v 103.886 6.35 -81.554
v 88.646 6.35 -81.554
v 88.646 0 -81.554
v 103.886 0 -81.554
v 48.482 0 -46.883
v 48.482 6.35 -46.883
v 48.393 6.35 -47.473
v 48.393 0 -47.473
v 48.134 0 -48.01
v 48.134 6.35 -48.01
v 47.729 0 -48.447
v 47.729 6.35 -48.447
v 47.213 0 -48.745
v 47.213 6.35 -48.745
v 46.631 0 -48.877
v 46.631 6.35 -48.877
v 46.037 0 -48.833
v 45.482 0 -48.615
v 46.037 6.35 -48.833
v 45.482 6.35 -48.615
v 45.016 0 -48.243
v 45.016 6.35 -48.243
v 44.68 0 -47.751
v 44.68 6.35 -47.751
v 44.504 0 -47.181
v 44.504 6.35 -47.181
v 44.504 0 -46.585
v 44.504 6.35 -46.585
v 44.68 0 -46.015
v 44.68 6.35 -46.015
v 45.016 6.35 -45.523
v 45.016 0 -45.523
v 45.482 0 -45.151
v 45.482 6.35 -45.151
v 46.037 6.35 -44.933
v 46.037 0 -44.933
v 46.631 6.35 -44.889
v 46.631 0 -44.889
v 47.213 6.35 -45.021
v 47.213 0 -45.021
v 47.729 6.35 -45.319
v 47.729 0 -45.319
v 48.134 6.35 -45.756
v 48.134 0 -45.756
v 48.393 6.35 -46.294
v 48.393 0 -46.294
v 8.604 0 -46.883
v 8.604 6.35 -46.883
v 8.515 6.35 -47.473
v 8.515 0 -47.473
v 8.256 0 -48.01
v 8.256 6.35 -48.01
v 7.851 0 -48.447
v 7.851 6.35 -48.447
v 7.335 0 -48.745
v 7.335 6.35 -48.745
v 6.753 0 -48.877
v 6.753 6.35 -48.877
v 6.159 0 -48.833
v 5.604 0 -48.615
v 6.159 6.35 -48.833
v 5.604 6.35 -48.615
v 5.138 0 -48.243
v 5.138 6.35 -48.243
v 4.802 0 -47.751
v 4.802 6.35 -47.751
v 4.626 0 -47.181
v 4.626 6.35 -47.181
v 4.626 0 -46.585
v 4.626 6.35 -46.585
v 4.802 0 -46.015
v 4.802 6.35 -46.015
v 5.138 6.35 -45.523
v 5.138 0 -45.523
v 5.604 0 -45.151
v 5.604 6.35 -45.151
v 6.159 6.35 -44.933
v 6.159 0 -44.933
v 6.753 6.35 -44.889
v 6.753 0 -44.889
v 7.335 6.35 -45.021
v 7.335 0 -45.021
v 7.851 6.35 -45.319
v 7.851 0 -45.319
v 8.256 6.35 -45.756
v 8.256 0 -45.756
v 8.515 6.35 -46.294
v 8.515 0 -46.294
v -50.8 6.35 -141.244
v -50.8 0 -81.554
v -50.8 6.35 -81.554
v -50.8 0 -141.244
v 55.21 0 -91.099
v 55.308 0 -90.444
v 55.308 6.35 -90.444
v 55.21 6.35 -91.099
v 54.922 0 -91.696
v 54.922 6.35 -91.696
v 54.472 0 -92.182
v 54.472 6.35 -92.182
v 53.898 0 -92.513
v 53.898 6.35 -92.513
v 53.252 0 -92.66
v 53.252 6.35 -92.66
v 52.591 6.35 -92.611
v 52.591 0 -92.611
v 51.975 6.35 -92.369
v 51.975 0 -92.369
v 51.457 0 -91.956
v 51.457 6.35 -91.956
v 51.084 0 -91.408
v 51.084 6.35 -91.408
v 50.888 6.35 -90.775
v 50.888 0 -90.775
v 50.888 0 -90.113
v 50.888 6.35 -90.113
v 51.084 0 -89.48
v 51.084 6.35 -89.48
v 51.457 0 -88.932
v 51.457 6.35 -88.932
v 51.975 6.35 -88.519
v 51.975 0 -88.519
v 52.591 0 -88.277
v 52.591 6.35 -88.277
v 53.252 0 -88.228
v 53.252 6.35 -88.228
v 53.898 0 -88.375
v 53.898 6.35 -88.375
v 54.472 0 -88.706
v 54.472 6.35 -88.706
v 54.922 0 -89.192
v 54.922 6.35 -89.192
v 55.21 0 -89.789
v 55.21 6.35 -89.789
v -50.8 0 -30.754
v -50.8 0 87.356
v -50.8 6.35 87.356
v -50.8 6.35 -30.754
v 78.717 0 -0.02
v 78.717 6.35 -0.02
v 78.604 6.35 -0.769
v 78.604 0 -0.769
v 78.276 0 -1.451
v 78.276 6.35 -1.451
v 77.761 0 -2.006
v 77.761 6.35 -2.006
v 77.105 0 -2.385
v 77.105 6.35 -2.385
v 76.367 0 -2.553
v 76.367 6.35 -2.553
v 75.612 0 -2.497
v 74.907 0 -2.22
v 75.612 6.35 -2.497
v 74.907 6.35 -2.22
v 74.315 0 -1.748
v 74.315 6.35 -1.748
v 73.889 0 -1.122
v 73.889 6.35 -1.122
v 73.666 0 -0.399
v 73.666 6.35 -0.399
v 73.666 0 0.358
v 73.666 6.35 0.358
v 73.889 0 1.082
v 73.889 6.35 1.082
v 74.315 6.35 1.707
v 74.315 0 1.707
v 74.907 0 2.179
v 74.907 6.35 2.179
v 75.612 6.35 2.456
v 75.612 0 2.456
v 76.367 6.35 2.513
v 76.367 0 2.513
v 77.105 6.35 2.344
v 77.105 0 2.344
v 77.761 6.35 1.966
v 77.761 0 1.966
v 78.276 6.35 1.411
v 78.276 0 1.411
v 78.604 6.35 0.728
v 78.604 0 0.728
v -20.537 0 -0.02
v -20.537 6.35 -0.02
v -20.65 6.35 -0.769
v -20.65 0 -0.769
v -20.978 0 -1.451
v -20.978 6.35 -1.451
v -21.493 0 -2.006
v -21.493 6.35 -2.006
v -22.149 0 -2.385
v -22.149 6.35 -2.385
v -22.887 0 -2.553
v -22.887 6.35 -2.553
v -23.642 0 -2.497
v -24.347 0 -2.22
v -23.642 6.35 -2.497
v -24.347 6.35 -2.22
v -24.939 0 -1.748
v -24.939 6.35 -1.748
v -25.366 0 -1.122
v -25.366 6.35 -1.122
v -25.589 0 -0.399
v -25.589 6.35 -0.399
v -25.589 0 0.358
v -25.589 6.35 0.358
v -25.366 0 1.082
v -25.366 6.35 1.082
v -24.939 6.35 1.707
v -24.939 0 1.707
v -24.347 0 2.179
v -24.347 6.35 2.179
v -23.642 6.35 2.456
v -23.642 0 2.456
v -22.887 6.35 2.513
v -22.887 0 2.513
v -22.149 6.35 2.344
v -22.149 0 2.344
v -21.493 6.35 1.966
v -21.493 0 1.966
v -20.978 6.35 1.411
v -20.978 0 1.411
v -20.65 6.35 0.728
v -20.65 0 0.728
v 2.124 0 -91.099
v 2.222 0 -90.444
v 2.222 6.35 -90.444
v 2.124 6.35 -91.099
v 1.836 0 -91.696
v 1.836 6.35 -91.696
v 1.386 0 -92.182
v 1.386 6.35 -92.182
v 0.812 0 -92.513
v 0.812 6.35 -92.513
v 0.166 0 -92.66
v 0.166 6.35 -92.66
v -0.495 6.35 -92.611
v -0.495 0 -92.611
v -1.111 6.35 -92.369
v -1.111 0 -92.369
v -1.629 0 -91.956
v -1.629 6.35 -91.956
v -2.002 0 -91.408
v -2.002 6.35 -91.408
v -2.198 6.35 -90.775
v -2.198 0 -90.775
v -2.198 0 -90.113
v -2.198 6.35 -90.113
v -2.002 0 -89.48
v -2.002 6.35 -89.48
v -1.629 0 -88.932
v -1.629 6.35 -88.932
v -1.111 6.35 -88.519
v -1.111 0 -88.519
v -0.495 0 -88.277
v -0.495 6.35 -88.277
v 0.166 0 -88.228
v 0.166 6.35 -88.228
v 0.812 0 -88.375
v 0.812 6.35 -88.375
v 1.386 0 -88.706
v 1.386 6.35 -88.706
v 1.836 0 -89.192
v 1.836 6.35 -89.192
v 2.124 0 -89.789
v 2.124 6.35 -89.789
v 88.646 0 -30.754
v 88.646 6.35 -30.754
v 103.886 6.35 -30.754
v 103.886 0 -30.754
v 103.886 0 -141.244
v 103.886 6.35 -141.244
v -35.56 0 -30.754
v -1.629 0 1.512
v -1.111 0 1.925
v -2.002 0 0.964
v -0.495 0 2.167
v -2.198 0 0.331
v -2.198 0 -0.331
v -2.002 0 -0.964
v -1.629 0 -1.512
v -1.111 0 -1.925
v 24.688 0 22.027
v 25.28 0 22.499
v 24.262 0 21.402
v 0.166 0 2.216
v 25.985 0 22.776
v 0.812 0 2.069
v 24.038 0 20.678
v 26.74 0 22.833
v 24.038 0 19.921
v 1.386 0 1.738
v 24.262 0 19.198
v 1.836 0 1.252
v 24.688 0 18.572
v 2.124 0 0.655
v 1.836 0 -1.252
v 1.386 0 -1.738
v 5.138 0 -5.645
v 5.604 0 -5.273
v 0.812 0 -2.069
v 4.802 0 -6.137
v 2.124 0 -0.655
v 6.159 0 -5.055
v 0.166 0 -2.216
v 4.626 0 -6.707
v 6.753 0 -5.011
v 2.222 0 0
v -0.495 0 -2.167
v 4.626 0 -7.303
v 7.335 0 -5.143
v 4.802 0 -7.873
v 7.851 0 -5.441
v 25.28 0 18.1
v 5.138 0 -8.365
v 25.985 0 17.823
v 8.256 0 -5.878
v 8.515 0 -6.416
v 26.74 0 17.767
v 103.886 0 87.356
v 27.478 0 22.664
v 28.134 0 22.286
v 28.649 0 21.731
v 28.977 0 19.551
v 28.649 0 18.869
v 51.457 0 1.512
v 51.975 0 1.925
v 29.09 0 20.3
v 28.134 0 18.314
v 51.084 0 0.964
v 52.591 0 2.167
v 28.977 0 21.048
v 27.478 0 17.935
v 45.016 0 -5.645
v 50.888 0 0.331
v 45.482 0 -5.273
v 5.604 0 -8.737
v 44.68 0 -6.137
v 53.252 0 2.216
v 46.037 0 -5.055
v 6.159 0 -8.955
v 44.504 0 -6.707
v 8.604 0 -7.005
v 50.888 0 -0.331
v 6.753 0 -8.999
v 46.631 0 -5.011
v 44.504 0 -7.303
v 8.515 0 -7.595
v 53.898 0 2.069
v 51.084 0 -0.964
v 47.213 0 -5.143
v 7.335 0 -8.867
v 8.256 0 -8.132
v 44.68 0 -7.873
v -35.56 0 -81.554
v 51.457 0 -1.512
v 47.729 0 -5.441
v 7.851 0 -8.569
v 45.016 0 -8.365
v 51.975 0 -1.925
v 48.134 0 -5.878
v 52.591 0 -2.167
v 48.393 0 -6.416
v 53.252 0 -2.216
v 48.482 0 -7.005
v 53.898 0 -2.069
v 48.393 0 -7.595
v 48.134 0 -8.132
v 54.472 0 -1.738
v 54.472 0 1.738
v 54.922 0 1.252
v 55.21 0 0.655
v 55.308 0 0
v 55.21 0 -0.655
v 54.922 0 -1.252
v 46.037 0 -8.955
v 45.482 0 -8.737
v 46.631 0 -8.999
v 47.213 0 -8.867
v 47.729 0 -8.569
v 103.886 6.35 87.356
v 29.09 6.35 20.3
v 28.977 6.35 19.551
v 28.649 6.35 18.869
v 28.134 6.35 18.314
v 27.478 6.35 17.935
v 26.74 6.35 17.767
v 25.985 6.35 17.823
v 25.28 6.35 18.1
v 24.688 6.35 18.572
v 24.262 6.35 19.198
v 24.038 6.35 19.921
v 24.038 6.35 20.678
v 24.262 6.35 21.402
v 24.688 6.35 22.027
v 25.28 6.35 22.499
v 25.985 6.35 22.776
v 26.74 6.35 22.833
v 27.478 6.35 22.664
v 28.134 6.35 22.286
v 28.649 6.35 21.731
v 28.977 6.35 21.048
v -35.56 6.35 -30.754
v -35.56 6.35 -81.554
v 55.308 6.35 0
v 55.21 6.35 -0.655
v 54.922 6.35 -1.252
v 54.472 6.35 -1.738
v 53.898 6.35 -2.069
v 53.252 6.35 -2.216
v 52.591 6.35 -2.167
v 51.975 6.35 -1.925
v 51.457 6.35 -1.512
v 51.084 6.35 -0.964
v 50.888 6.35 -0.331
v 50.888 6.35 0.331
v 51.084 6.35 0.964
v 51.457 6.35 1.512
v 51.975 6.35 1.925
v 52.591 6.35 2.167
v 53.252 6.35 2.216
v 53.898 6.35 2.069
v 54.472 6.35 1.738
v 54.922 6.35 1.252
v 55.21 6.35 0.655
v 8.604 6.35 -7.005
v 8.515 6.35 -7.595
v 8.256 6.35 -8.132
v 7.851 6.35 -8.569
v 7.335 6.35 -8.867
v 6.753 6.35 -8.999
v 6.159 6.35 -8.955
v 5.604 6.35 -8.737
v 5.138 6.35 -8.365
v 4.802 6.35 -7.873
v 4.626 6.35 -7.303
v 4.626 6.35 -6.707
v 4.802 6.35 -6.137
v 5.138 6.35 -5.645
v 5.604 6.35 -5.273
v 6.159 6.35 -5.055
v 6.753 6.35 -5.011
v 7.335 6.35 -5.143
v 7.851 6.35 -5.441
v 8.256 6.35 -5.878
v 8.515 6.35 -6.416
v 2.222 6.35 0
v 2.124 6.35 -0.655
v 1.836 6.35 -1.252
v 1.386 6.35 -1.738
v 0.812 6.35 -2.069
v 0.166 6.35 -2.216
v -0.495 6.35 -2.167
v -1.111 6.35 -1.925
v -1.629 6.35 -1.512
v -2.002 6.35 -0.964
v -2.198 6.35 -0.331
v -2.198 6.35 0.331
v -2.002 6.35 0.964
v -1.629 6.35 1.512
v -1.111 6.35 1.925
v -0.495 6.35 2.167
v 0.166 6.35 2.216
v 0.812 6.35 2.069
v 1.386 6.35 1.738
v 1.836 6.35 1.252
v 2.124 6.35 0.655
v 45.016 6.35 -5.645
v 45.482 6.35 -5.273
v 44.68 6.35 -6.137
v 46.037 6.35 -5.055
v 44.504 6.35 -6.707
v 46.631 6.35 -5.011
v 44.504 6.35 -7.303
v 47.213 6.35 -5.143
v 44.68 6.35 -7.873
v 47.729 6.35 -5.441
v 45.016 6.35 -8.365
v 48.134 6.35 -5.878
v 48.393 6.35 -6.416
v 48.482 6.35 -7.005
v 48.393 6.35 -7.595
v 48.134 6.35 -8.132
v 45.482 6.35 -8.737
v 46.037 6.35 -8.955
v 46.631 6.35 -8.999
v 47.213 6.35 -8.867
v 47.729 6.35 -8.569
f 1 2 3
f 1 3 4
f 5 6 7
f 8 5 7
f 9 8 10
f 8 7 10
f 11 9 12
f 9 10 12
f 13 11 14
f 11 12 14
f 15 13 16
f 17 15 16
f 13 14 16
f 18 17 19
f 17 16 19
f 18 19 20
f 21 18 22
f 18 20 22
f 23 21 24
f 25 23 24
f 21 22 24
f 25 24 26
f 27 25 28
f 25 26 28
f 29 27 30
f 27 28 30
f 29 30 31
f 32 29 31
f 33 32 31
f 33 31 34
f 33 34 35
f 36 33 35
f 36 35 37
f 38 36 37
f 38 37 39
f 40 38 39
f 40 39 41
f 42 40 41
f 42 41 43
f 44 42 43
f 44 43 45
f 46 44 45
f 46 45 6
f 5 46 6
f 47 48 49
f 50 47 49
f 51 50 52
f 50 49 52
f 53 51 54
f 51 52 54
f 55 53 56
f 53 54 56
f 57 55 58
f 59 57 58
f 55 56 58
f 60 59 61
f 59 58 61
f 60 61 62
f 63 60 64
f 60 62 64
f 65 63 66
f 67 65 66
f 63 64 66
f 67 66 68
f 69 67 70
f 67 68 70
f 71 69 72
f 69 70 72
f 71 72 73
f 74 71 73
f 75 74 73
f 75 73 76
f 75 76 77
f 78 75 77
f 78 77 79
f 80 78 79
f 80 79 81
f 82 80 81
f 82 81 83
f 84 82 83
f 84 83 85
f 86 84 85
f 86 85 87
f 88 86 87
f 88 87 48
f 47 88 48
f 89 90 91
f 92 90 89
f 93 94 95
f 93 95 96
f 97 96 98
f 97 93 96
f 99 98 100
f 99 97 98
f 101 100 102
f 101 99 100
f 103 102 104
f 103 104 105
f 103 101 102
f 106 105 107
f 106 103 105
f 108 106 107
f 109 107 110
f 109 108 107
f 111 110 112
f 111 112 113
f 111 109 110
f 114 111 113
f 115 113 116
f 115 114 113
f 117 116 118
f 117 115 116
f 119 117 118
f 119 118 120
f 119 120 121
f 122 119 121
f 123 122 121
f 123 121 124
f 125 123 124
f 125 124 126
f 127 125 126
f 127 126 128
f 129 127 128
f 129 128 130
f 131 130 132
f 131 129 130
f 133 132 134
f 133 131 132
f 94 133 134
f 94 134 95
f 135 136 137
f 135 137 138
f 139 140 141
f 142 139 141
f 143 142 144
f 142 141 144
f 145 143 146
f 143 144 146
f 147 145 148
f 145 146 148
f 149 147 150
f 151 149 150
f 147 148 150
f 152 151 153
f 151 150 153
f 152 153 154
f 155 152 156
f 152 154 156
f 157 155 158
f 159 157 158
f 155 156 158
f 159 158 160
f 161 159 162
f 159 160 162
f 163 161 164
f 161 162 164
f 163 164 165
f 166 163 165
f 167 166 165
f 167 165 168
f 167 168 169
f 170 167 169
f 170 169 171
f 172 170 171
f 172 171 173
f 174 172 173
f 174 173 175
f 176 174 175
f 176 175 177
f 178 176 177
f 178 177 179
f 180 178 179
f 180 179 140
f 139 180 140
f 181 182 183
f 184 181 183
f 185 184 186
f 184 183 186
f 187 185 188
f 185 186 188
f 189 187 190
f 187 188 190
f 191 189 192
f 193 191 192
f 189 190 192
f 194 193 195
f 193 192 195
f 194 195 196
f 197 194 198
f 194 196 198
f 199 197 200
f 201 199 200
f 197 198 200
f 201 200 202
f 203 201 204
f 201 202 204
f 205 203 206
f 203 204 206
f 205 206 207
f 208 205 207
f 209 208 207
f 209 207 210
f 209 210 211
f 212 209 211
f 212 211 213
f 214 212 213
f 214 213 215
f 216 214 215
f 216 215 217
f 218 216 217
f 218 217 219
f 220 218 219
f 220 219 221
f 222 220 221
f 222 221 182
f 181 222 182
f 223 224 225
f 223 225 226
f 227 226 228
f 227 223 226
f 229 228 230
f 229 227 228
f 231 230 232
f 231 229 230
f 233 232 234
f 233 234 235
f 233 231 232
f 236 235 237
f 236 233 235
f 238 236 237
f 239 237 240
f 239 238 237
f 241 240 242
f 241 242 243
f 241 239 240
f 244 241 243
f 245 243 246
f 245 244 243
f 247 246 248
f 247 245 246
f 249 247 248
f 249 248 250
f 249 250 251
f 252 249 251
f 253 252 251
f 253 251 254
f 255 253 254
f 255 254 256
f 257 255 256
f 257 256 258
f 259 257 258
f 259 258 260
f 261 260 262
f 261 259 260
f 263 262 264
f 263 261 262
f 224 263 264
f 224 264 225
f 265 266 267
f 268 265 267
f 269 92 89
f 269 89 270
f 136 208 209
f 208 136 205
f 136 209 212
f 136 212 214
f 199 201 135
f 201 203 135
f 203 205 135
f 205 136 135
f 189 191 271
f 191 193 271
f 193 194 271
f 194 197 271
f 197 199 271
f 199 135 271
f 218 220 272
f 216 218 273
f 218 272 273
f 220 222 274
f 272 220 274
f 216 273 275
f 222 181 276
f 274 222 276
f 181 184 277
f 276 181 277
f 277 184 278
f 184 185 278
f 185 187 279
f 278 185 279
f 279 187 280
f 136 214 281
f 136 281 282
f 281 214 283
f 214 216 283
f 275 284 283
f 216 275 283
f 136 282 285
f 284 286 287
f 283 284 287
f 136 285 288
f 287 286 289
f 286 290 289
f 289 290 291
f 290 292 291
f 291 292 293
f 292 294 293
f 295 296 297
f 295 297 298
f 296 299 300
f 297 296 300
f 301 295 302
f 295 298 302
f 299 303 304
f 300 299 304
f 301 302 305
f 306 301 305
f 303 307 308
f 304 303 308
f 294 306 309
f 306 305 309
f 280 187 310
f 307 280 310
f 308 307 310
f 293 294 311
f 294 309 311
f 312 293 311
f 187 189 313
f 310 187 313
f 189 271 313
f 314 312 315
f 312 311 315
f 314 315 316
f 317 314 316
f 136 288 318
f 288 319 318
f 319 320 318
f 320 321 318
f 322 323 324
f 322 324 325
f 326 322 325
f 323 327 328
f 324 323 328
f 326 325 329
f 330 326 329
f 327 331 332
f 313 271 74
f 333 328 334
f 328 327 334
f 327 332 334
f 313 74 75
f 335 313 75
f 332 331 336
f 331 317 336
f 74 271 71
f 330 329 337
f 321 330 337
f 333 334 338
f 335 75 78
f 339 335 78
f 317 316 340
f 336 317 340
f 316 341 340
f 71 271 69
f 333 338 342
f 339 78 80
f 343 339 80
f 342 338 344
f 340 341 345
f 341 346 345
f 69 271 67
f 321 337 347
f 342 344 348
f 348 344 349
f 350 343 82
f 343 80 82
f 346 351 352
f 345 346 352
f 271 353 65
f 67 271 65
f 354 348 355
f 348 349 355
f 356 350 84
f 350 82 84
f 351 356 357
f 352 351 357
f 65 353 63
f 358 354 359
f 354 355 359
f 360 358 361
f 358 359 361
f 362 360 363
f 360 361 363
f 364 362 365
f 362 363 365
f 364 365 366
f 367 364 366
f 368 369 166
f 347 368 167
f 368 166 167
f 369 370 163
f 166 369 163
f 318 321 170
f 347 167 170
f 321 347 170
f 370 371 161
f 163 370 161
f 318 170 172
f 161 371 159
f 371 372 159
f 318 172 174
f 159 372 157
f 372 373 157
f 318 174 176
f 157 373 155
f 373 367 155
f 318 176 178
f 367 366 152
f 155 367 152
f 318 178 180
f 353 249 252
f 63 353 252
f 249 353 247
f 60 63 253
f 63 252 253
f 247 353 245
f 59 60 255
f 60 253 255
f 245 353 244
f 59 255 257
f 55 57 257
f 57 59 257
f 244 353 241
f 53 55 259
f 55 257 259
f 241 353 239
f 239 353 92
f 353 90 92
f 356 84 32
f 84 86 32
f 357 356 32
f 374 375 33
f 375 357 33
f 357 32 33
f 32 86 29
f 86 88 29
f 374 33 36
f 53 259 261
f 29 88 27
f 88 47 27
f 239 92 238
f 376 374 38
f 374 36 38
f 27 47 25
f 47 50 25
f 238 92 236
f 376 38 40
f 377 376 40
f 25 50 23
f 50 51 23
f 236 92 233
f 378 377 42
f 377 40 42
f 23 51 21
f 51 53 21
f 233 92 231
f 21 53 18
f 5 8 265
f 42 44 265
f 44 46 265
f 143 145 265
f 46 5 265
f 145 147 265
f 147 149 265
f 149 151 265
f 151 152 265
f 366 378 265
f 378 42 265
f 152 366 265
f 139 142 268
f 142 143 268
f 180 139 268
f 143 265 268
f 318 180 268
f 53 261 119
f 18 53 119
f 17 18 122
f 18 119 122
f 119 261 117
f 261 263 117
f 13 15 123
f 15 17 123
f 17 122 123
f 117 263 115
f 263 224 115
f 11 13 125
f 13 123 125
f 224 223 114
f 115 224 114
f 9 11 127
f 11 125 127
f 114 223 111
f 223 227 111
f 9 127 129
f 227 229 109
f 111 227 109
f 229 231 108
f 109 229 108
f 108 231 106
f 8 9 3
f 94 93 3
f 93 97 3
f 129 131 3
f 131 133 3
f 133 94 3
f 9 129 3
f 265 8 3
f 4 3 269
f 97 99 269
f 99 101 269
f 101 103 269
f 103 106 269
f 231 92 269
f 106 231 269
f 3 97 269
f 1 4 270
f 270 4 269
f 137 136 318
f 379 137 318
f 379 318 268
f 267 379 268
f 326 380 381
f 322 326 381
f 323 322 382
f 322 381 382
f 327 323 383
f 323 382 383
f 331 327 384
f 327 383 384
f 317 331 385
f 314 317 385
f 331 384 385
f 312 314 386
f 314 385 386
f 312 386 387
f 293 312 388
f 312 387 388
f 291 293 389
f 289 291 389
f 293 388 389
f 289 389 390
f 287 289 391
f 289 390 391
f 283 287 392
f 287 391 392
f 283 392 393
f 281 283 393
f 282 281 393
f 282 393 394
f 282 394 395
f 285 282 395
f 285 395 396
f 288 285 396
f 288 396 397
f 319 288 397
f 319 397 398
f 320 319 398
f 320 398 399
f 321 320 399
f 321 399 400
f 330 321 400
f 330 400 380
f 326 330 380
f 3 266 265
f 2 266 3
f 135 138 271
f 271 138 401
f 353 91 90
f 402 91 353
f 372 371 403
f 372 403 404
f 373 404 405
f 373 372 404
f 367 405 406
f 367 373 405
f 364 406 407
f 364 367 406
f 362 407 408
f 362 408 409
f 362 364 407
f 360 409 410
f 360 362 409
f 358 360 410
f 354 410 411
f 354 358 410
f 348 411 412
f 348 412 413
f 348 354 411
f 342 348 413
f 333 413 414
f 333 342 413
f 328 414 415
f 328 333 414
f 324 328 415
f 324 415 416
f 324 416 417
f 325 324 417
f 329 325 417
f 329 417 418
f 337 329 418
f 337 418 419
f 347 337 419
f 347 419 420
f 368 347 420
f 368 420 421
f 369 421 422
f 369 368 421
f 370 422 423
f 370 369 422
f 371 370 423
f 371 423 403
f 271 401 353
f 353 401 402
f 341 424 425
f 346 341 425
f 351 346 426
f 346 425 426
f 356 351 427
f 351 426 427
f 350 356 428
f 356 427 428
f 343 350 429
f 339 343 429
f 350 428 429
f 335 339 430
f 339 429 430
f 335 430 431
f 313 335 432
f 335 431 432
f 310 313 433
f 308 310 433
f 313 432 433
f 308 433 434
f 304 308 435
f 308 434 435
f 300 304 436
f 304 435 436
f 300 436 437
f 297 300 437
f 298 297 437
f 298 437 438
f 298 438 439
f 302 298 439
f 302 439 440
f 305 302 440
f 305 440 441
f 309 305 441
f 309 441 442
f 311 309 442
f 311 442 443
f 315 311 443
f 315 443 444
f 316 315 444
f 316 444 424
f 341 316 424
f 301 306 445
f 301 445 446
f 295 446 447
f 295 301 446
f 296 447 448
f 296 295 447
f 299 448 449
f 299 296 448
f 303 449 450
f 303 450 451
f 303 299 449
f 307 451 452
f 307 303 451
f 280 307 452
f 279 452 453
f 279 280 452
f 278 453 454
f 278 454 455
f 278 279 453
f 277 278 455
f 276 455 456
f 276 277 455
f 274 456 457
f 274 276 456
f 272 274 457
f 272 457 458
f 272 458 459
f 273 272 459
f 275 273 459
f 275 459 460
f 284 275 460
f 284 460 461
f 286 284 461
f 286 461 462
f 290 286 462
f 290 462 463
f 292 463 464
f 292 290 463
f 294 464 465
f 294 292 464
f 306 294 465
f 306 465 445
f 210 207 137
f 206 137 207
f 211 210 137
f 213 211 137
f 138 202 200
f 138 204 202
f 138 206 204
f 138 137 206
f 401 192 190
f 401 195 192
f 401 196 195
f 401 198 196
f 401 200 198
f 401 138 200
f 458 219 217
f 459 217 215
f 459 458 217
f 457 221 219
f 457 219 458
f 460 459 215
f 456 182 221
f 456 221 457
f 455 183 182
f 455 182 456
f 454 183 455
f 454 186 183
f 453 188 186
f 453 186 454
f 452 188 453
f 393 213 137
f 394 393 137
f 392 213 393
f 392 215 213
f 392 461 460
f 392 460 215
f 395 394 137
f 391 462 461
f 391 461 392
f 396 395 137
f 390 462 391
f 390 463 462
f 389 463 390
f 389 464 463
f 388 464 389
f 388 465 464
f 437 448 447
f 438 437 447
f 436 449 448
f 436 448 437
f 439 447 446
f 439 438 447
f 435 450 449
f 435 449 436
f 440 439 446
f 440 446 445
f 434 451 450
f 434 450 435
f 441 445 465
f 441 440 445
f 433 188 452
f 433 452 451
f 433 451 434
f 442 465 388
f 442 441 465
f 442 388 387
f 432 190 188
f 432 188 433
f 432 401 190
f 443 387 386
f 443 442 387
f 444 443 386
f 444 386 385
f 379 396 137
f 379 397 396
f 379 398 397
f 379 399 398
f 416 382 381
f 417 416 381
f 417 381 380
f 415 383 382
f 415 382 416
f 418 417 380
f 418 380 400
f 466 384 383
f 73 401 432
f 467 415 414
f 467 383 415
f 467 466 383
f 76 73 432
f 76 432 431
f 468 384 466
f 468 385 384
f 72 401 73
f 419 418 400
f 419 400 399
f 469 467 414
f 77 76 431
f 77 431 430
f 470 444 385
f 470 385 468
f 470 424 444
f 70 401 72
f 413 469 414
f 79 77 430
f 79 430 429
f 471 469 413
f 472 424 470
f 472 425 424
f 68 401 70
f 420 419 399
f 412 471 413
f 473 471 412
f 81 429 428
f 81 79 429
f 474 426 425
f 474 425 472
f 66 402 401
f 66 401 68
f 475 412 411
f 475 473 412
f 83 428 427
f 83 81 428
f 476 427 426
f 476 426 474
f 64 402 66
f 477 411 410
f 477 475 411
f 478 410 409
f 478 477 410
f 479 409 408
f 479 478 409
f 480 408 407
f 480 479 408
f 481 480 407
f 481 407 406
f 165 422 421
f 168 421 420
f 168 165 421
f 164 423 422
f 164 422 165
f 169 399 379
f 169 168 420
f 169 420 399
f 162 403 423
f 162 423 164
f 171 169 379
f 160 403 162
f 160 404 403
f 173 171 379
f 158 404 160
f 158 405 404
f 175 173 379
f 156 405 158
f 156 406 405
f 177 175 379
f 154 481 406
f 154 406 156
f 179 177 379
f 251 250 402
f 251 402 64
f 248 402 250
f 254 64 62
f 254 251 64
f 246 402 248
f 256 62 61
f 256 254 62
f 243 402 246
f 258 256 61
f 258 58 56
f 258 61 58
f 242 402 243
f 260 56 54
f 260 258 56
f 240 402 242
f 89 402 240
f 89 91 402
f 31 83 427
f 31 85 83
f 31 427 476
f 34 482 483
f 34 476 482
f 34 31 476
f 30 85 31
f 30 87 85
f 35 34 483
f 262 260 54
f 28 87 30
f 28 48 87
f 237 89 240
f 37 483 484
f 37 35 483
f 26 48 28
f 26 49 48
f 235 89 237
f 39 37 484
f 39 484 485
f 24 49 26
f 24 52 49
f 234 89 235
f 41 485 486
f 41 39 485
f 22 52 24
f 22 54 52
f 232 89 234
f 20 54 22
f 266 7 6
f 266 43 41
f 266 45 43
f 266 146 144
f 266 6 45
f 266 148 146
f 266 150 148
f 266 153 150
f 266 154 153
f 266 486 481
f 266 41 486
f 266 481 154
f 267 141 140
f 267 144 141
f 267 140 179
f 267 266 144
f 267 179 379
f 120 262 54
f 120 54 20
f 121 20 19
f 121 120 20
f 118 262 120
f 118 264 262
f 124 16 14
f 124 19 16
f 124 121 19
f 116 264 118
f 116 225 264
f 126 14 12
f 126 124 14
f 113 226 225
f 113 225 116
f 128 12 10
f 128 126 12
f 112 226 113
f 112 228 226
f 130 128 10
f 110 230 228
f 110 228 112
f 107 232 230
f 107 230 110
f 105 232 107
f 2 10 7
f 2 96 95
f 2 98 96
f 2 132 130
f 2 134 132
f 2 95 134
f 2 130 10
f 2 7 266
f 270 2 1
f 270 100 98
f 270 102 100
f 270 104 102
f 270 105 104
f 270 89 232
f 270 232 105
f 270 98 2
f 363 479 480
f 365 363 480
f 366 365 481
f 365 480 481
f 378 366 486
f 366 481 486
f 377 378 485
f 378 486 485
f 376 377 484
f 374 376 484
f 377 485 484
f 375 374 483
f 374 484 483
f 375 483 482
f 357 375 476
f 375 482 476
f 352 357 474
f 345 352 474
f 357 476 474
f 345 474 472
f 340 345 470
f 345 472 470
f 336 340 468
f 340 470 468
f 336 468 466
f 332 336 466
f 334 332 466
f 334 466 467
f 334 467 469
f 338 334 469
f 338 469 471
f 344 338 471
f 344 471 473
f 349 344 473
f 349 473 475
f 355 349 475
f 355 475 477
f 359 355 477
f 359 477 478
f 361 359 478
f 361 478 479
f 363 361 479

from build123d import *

# Parameters (mm, degrees)
SKETCH2_W           = 154.686
SKETCH2_H           = 228.6
BOSS_EXTRUDE1_DEPTH = 6.35
SKETCH1_R           = 2.2225
CUT_EXTRUDE1_DEPTH  = 6.35
SKETCH3_W           = 15.24
SKETCH3_H           = 50.8
CUT_EXTRUDE2_DEPTH  = 6.35
SKETCH8_R           = 2.54
CUT_EXTRUDE3_DEPTH  = 17.78
SKETCH10_R          = 2
CUT_EXTRUDE4_DEPTH  = 7.35


with BuildPart() as part:
    # Sketch2 → Boss-Extrude1 (new body)
    with BuildSketch(Plane(origin=(0, 0, 0), x_dir=(1, 0, 0), z_dir=(0, 1, 0))):
        with Locations((26.543, 26.944051327)):
            Rectangle(SKETCH2_W, SKETCH2_H)
    extrude(amount=BOSS_EXTRUDE1_DEPTH)

    # Sketch1 → Cut-Extrude1 (cut)
    with BuildSketch(Plane(origin=(0, 0, 0), x_dir=(1, 0, 0), z_dir=(0, 1, 0))):
        with Locations((0, 90.444051327)):
            Circle(SKETCH1_R)
        with Locations((53.086, 90.444051327)):
            Circle(SKETCH1_R)
        Circle(SKETCH1_R)
        with Locations((53.086, 0)):
            Circle(SKETCH1_R)
    extrude(amount=CUT_EXTRUDE1_DEPTH, mode=Mode.SUBTRACT)

    # Sketch3 → Cut-Extrude2 (cut)
    with BuildSketch(Plane(origin=(0, 6.35, 0), x_dir=(1, 0, 0), z_dir=(0, 1, 0))):
        with Locations((96.266, 56.154051327)):
            Rectangle(SKETCH3_W, SKETCH3_H)
        with Locations((-43.18, 56.154051327)):
            Rectangle(SKETCH3_W, SKETCH3_H)
    extrude(amount=-CUT_EXTRUDE2_DEPTH, mode=Mode.SUBTRACT)

    # Sketch8 → Cut-Extrude3 (cut)
    with BuildSketch(Plane(origin=(0, 6.35, 0), x_dir=(1, 0, 0), z_dir=(0, 1, 0))):
        with Locations((26.550112, -20.29968)):
            Circle(SKETCH8_R)
        with Locations((-23.077082804, 0.02032)):
            Circle(SKETCH8_R)
        with Locations((76.177306804, 0.02032)):
            Circle(SKETCH8_R)
    extrude(amount=-CUT_EXTRUDE3_DEPTH, mode=Mode.SUBTRACT)

    # Sketch10 → Cut-Extrude4 (cut, through all)
    with BuildSketch(Plane(origin=(0, 6.35, 0), x_dir=(1, 0, 0), z_dir=(0, 1, 0))):
        with Locations((6.604, 7.005051327)):
            Circle(SKETCH10_R)
        with Locations((46.482, 7.005051327)):
            Circle(SKETCH10_R)
        with Locations((46.482, 46.883051327)):
            Circle(SKETCH10_R)
        with Locations((6.604, 46.883051327)):
            Circle(SKETCH10_R)
    extrude(amount=-CUT_EXTRUDE4_DEPTH, mode=Mode.SUBTRACT)


solid = part.part
